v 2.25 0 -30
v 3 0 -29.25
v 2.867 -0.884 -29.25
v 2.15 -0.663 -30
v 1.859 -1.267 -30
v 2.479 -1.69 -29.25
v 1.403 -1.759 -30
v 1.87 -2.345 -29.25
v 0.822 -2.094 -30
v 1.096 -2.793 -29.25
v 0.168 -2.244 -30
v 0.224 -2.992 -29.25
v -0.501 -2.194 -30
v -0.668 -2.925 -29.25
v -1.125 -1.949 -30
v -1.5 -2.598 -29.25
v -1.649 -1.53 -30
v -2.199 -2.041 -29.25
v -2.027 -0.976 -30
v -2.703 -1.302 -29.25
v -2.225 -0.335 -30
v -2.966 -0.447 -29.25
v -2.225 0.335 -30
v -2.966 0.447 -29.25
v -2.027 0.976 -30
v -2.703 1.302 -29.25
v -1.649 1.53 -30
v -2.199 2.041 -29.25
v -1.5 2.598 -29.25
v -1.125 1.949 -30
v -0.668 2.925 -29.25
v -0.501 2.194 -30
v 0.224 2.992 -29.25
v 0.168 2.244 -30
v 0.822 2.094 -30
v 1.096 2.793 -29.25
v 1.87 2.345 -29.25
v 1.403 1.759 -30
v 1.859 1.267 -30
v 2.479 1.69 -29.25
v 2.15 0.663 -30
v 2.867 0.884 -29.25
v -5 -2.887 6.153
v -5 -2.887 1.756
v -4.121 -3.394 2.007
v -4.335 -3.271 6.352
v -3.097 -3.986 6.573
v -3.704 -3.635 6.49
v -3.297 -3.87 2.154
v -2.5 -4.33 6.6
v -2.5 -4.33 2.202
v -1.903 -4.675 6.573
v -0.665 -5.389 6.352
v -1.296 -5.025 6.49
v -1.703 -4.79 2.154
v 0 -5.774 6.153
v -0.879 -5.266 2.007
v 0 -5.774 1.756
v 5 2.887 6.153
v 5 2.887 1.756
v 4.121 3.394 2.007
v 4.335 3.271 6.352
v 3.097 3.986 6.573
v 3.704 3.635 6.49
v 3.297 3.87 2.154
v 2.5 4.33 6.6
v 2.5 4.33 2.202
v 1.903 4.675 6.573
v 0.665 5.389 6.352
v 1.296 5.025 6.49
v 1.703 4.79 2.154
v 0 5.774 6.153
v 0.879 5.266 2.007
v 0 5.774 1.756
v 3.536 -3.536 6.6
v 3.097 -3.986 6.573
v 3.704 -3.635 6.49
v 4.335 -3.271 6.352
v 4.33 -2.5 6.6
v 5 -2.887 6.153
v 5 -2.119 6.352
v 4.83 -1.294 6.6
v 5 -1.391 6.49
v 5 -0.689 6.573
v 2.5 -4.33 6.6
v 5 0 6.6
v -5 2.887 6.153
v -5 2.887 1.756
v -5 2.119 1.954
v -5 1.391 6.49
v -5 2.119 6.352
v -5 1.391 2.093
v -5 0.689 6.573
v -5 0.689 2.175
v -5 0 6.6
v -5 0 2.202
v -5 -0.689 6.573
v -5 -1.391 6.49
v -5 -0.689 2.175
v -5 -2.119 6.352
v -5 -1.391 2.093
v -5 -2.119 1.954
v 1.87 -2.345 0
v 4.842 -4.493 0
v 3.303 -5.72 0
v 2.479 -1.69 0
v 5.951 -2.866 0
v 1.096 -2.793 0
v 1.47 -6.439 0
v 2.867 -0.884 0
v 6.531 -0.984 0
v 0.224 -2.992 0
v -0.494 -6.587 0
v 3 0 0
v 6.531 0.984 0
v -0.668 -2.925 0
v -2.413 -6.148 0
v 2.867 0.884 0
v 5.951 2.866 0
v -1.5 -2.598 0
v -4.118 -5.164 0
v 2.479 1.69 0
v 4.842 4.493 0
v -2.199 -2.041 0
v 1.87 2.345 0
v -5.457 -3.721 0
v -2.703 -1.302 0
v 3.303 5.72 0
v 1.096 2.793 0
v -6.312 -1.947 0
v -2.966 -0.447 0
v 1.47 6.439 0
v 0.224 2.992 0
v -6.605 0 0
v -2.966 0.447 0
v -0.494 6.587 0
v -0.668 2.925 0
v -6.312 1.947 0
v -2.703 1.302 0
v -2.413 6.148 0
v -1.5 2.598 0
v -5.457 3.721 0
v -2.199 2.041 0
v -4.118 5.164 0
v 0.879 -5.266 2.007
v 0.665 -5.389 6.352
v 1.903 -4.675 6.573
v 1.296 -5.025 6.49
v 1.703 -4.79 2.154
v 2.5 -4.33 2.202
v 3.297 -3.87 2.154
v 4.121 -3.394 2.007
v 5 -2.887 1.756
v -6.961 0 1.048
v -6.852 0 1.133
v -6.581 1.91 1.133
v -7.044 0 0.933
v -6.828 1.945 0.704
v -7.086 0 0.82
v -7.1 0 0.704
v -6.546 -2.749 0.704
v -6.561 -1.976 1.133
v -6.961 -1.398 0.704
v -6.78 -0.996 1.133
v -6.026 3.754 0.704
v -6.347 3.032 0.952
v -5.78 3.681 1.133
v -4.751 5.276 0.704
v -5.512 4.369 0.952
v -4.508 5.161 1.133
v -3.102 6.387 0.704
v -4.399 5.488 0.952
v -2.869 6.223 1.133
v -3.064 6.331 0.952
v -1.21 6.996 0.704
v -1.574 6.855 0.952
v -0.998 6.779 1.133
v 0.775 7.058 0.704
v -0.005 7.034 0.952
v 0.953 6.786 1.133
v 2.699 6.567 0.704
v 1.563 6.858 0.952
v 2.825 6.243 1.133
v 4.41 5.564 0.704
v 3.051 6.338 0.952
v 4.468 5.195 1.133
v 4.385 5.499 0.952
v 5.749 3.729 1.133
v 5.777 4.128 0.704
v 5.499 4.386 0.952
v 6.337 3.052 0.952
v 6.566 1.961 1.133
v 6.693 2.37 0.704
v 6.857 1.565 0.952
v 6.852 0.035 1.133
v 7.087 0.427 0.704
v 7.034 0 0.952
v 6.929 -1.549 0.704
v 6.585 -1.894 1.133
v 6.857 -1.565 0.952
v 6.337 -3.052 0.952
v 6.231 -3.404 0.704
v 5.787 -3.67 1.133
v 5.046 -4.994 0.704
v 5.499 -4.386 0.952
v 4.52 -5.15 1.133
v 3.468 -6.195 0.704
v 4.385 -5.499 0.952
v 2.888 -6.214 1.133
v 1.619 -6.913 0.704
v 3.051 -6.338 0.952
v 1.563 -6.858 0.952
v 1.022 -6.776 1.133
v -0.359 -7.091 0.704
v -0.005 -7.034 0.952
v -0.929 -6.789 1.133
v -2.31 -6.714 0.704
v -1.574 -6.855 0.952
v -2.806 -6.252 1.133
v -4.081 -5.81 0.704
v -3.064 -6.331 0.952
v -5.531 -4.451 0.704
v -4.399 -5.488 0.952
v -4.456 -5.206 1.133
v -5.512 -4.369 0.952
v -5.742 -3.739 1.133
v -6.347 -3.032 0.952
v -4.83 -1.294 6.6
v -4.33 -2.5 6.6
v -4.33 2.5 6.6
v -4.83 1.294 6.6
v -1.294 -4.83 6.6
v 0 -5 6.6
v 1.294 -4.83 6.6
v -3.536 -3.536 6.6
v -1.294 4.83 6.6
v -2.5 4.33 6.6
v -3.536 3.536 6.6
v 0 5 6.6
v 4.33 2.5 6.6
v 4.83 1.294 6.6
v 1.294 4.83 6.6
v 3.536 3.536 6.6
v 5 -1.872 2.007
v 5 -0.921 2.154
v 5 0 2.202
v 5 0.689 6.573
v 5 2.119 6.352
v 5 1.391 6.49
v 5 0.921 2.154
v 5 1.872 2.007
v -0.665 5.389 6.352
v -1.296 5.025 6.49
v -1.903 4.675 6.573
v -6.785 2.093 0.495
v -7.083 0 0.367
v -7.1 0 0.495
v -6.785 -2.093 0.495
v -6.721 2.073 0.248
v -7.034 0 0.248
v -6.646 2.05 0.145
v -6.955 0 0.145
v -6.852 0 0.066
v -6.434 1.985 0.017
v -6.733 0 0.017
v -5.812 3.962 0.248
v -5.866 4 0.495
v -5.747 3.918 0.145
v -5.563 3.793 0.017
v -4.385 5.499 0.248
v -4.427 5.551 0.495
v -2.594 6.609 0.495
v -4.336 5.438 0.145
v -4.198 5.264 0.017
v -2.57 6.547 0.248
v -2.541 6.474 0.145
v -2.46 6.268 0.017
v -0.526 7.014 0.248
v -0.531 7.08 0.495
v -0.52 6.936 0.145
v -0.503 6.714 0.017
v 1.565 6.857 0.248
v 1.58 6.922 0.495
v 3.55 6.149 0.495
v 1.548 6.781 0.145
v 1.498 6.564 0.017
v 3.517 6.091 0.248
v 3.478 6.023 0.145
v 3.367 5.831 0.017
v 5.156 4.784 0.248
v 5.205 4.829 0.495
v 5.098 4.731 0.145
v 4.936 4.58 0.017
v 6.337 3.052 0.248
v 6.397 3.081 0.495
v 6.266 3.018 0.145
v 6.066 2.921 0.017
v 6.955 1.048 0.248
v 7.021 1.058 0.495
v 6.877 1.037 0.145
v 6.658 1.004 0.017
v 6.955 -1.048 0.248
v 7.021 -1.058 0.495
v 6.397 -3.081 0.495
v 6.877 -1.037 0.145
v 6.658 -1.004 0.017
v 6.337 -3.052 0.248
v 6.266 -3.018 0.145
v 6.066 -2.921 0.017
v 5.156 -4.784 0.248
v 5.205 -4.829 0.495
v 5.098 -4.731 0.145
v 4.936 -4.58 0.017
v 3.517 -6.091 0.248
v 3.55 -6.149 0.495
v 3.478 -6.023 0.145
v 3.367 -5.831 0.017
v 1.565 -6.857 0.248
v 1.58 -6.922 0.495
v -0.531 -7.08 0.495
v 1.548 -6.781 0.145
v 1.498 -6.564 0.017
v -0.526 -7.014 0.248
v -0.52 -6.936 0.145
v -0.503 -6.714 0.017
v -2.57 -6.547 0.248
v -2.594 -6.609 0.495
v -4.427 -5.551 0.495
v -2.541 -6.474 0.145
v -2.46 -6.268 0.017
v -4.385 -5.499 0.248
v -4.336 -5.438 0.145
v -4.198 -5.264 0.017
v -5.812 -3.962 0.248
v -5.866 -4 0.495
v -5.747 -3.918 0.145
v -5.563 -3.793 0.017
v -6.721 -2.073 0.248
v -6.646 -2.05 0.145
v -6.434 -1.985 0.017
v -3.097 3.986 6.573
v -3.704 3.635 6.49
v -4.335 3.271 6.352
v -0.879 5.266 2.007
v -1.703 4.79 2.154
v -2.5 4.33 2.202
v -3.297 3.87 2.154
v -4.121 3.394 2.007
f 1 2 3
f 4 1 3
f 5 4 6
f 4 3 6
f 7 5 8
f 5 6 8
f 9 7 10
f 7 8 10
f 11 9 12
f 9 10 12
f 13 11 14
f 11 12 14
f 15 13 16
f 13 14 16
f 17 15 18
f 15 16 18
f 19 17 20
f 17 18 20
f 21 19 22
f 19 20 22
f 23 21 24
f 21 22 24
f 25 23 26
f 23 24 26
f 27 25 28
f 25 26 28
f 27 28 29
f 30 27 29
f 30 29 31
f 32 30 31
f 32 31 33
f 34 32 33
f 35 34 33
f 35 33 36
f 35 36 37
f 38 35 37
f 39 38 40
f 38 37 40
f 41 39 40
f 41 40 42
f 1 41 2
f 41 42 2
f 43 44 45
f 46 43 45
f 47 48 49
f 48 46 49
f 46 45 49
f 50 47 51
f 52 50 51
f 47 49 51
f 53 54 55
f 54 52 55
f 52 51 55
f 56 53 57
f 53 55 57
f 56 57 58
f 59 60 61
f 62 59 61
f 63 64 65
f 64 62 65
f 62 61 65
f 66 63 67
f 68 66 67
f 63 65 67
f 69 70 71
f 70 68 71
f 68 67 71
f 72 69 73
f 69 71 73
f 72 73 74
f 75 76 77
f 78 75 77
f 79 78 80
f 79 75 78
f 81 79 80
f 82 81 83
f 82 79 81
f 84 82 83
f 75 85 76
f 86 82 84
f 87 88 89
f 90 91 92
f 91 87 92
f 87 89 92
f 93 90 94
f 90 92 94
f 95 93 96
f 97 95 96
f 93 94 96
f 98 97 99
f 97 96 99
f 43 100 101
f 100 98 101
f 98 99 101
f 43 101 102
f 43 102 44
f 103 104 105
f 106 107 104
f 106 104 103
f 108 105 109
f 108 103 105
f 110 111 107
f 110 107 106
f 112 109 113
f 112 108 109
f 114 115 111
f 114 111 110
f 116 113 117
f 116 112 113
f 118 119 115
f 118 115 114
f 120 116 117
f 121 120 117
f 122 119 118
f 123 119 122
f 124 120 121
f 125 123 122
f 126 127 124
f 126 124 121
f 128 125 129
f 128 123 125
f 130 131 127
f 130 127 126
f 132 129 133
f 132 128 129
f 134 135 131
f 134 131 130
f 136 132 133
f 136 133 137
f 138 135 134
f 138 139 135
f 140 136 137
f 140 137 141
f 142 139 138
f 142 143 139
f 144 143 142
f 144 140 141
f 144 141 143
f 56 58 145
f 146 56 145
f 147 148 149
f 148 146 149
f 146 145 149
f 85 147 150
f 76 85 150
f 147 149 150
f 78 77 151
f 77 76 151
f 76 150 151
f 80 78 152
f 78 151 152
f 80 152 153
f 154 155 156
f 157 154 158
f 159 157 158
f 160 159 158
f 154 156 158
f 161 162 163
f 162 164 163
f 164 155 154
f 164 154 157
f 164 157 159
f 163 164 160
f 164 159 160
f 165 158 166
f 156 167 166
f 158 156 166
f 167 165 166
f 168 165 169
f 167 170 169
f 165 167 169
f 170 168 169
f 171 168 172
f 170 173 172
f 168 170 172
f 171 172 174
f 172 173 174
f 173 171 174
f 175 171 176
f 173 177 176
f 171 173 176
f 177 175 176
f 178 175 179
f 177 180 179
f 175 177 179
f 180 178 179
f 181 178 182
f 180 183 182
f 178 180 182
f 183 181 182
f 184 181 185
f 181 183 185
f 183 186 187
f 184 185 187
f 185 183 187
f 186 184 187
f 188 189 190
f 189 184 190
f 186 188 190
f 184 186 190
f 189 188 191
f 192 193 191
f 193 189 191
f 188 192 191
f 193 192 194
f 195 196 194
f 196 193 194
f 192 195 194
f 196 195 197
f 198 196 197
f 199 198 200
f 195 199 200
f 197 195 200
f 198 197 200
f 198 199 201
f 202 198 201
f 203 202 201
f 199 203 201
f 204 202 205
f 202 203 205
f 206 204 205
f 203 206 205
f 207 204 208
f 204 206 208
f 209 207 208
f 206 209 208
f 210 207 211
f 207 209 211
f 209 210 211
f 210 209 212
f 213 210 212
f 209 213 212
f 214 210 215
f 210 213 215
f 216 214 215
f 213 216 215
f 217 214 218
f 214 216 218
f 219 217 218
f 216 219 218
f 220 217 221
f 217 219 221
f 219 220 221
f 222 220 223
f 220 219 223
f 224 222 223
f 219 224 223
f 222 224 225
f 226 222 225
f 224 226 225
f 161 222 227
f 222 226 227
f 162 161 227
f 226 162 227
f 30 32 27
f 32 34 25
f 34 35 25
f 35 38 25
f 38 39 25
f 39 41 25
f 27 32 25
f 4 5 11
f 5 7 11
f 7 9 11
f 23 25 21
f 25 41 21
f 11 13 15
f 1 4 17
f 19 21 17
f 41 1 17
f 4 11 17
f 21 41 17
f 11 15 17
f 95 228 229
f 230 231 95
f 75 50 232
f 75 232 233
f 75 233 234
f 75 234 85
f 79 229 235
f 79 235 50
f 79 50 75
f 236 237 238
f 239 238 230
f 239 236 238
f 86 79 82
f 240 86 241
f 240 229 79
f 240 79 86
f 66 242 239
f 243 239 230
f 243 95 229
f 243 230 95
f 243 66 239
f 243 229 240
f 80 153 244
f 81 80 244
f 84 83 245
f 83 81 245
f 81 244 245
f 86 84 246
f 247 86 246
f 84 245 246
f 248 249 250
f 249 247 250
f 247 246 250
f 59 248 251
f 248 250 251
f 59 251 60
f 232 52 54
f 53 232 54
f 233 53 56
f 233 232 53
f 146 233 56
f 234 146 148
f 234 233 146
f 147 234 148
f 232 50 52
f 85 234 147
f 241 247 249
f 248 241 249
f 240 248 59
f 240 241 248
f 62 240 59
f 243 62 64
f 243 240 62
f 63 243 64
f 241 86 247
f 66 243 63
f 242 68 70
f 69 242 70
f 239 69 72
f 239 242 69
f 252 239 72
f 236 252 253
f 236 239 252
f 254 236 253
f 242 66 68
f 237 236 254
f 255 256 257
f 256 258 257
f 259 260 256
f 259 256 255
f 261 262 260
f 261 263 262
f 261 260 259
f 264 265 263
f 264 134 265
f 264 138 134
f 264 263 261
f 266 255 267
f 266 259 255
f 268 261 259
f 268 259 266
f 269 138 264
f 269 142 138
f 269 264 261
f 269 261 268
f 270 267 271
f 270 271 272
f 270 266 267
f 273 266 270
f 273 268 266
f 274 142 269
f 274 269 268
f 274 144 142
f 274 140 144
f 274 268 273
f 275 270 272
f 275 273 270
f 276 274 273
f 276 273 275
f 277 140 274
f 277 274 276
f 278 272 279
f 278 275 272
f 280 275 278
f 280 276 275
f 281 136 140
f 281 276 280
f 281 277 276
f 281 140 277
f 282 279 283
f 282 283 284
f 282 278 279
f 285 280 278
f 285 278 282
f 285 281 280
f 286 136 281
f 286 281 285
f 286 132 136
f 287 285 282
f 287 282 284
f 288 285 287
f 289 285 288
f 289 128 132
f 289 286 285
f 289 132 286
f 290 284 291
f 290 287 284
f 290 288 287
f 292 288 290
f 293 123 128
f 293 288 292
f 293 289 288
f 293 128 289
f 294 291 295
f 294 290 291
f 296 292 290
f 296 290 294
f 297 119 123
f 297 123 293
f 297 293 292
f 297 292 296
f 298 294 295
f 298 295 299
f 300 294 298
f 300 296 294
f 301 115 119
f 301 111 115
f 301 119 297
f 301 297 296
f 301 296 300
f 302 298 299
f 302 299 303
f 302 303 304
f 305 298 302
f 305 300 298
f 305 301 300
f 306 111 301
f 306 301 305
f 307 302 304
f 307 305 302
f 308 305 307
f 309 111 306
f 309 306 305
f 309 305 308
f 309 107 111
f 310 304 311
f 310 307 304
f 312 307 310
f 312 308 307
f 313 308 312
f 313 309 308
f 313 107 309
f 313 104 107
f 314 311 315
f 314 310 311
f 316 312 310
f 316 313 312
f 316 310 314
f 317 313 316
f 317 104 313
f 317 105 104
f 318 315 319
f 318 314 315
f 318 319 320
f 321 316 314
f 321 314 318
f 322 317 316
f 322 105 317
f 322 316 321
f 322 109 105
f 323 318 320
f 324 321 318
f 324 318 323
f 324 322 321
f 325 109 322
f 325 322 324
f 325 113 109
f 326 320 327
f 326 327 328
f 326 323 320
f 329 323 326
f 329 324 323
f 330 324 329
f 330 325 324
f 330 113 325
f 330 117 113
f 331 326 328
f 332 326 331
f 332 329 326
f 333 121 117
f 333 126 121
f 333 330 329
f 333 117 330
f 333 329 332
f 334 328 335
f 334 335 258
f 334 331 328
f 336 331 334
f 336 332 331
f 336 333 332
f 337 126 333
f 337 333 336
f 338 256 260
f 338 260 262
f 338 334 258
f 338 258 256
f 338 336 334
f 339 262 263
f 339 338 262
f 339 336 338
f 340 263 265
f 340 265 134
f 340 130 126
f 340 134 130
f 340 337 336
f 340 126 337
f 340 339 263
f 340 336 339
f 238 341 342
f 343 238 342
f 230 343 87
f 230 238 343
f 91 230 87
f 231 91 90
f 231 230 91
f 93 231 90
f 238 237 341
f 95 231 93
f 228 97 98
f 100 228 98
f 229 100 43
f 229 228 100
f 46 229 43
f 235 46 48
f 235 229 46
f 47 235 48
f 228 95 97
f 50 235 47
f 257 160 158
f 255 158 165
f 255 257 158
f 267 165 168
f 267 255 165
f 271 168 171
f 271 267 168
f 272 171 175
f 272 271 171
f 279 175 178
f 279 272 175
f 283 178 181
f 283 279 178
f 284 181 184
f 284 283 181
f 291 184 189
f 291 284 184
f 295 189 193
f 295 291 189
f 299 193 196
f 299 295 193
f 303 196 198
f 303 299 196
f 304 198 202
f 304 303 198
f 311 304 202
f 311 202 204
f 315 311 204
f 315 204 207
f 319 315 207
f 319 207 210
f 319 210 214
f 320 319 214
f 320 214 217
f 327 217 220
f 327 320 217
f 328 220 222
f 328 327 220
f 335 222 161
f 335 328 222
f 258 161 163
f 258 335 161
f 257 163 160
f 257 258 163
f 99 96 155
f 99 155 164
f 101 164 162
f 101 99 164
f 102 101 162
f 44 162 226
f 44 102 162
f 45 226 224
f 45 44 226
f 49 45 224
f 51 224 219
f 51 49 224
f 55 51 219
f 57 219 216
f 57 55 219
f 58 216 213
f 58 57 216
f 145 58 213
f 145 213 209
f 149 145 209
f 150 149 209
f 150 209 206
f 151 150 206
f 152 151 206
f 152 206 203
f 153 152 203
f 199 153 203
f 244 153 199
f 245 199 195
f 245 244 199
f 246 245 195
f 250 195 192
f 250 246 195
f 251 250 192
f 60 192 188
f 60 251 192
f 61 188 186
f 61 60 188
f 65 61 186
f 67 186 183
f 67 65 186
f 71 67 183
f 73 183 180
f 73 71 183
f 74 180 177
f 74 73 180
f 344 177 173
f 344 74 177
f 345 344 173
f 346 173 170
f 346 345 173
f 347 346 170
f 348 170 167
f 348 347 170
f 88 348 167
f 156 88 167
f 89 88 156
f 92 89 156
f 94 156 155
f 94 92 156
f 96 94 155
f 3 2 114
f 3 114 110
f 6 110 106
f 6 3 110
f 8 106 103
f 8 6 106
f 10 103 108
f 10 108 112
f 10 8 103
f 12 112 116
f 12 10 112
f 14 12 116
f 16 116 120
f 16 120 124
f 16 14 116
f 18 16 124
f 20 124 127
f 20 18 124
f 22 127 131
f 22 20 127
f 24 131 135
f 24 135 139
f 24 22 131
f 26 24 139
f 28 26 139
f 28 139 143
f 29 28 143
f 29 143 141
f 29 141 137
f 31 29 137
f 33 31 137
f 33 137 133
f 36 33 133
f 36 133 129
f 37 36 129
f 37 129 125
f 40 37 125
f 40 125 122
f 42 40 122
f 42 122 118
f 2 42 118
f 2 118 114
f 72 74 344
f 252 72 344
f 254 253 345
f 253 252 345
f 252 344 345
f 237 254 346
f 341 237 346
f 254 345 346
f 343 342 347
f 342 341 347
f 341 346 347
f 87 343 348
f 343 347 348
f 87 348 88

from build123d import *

# Parameters (mm, degrees)
EXTRUDE1_DEPTH     = 6.6
SKETCH2_R          = 7.1
EXTRUDE2_DEPTH     = 0.99
SKETCH15_OUTSIDE_W = 43.29
SKETCH15_OUTSIDE_H = 43.29
SKETCH15_OUTSIDE_R = 5
CUT_EXTRUDE5_DEPTH = 6.6
CUT_EXTRUDE5_DRAFT = -60
SKETCH5_W          = 30
SKETCH5_H          = 3
CHAMFER1_SIZE      = 0.75
SKETCH11_R         = 7.1
EXTRUDE3_DEPTH     = 3.3
EXTRUDE3_TAPER     = 60
FILLET1_R          = 0.495


with BuildPart() as part:
    # Sketch1 → Extrude1 (new body)
    with BuildSketch(Plane.XY):
        Polygon((5, -2.886751346), (5, 2.886751346), (0, 5.773502692), (-5, 2.886751346), (-5, -2.886751346), (0, -5.773502692), align=None)
    extrude(amount=EXTRUDE1_DEPTH)

    # Sketch2 → Extrude2 (add)
    with BuildSketch(Plane(origin=(0, 0, 0), x_dir=(-1, 0, 0), z_dir=(0, 0, -1))):
        Circle(SKETCH2_R)
    extrude(amount=-EXTRUDE2_DEPTH)


with BuildPart() as cut_extrude5_tool:
    # Sketch15 outside → Cut-Extrude5 (with draft: the straight prism first)
    with BuildSketch(Plane.XY.offset(6.6)):
        Rectangle(SKETCH15_OUTSIDE_W, SKETCH15_OUTSIDE_H)
        Circle(SKETCH15_OUTSIDE_R, mode=Mode.SUBTRACT)
    extrude(amount=-CUT_EXTRUDE5_DEPTH)
    # Cut-Extrude5: the draft: its side faces are tilted about the plane it starts from
    cut_extrude5_sides = [cut_extrude5_tool.faces().sort_by_distance(p)[0] for p in [
        (0, -21.645, 3.3),
        (21.645, 0, 3.3),
        (0, 21.645, 3.3),
        (-21.645, 0, 3.3),
        (-5, 0, 3.3),
    ]]
    draft(cut_extrude5_sides, Plane.XY.offset(6.6), CUT_EXTRUDE5_DRAFT)


with BuildPart() as part_1:
    add(part.part)

    # Cut-Extrude5: cut by cut_extrude5_tool
    add(cut_extrude5_tool.part, mode=Mode.SUBTRACT)


with BuildPart() as body_2:
    # Sketch5 → Revolve1 (revolve)
    with BuildSketch(Plane(origin=(0, 0, 0), x_dir=(0, 0, -1), z_dir=(1, 0, 0))):
        with Locations((15, 1.5)):
            Rectangle(SKETCH5_W, SKETCH5_H)
    revolve(axis=Axis((0, 0, -30), (0, 0, -1)))

    # Chamfer1
    chamfer1_edges = [body_2.edges().sort_by_distance(p)[0] for p in [
        (0, -3, -30),
    ]]
    chamfer(chamfer1_edges, length=CHAMFER1_SIZE)


with BuildPart() as part_2:
    add(part_1.part)

    # Combine1: union body 2
    add(body_2.part)

    # Sketch10 → Revolve2 (revolve)
    with BuildSketch(Plane(origin=(0, 0, 0), x_dir=(0, 0, -1), z_dir=(1, 0, 0))):
        Polygon((12, 2.350480947), (11.697124292, 3), (-0.875, 3), (-0.875, 0), (12, 0), align=None)
    revolve(axis=Axis((0, 0, 0.875), (0, 0, -1)))

    # Sketch11 → Extrude3 (add)
    with BuildSketch(Plane.XY.offset(0.99)):
        Circle(SKETCH11_R)
    extrude(amount=EXTRUDE3_DEPTH, taper=EXTRUDE3_TAPER)

    # Fillet1
    fillet1_edges = [part_2.edges().sort_by_distance(p)[0] for p in [
        (7.1, 0, 0),
        (0, -7.1, 0.99),
    ]]
    fillet(fillet1_edges, radius=FILLET1_R)


solid = part_2.part
